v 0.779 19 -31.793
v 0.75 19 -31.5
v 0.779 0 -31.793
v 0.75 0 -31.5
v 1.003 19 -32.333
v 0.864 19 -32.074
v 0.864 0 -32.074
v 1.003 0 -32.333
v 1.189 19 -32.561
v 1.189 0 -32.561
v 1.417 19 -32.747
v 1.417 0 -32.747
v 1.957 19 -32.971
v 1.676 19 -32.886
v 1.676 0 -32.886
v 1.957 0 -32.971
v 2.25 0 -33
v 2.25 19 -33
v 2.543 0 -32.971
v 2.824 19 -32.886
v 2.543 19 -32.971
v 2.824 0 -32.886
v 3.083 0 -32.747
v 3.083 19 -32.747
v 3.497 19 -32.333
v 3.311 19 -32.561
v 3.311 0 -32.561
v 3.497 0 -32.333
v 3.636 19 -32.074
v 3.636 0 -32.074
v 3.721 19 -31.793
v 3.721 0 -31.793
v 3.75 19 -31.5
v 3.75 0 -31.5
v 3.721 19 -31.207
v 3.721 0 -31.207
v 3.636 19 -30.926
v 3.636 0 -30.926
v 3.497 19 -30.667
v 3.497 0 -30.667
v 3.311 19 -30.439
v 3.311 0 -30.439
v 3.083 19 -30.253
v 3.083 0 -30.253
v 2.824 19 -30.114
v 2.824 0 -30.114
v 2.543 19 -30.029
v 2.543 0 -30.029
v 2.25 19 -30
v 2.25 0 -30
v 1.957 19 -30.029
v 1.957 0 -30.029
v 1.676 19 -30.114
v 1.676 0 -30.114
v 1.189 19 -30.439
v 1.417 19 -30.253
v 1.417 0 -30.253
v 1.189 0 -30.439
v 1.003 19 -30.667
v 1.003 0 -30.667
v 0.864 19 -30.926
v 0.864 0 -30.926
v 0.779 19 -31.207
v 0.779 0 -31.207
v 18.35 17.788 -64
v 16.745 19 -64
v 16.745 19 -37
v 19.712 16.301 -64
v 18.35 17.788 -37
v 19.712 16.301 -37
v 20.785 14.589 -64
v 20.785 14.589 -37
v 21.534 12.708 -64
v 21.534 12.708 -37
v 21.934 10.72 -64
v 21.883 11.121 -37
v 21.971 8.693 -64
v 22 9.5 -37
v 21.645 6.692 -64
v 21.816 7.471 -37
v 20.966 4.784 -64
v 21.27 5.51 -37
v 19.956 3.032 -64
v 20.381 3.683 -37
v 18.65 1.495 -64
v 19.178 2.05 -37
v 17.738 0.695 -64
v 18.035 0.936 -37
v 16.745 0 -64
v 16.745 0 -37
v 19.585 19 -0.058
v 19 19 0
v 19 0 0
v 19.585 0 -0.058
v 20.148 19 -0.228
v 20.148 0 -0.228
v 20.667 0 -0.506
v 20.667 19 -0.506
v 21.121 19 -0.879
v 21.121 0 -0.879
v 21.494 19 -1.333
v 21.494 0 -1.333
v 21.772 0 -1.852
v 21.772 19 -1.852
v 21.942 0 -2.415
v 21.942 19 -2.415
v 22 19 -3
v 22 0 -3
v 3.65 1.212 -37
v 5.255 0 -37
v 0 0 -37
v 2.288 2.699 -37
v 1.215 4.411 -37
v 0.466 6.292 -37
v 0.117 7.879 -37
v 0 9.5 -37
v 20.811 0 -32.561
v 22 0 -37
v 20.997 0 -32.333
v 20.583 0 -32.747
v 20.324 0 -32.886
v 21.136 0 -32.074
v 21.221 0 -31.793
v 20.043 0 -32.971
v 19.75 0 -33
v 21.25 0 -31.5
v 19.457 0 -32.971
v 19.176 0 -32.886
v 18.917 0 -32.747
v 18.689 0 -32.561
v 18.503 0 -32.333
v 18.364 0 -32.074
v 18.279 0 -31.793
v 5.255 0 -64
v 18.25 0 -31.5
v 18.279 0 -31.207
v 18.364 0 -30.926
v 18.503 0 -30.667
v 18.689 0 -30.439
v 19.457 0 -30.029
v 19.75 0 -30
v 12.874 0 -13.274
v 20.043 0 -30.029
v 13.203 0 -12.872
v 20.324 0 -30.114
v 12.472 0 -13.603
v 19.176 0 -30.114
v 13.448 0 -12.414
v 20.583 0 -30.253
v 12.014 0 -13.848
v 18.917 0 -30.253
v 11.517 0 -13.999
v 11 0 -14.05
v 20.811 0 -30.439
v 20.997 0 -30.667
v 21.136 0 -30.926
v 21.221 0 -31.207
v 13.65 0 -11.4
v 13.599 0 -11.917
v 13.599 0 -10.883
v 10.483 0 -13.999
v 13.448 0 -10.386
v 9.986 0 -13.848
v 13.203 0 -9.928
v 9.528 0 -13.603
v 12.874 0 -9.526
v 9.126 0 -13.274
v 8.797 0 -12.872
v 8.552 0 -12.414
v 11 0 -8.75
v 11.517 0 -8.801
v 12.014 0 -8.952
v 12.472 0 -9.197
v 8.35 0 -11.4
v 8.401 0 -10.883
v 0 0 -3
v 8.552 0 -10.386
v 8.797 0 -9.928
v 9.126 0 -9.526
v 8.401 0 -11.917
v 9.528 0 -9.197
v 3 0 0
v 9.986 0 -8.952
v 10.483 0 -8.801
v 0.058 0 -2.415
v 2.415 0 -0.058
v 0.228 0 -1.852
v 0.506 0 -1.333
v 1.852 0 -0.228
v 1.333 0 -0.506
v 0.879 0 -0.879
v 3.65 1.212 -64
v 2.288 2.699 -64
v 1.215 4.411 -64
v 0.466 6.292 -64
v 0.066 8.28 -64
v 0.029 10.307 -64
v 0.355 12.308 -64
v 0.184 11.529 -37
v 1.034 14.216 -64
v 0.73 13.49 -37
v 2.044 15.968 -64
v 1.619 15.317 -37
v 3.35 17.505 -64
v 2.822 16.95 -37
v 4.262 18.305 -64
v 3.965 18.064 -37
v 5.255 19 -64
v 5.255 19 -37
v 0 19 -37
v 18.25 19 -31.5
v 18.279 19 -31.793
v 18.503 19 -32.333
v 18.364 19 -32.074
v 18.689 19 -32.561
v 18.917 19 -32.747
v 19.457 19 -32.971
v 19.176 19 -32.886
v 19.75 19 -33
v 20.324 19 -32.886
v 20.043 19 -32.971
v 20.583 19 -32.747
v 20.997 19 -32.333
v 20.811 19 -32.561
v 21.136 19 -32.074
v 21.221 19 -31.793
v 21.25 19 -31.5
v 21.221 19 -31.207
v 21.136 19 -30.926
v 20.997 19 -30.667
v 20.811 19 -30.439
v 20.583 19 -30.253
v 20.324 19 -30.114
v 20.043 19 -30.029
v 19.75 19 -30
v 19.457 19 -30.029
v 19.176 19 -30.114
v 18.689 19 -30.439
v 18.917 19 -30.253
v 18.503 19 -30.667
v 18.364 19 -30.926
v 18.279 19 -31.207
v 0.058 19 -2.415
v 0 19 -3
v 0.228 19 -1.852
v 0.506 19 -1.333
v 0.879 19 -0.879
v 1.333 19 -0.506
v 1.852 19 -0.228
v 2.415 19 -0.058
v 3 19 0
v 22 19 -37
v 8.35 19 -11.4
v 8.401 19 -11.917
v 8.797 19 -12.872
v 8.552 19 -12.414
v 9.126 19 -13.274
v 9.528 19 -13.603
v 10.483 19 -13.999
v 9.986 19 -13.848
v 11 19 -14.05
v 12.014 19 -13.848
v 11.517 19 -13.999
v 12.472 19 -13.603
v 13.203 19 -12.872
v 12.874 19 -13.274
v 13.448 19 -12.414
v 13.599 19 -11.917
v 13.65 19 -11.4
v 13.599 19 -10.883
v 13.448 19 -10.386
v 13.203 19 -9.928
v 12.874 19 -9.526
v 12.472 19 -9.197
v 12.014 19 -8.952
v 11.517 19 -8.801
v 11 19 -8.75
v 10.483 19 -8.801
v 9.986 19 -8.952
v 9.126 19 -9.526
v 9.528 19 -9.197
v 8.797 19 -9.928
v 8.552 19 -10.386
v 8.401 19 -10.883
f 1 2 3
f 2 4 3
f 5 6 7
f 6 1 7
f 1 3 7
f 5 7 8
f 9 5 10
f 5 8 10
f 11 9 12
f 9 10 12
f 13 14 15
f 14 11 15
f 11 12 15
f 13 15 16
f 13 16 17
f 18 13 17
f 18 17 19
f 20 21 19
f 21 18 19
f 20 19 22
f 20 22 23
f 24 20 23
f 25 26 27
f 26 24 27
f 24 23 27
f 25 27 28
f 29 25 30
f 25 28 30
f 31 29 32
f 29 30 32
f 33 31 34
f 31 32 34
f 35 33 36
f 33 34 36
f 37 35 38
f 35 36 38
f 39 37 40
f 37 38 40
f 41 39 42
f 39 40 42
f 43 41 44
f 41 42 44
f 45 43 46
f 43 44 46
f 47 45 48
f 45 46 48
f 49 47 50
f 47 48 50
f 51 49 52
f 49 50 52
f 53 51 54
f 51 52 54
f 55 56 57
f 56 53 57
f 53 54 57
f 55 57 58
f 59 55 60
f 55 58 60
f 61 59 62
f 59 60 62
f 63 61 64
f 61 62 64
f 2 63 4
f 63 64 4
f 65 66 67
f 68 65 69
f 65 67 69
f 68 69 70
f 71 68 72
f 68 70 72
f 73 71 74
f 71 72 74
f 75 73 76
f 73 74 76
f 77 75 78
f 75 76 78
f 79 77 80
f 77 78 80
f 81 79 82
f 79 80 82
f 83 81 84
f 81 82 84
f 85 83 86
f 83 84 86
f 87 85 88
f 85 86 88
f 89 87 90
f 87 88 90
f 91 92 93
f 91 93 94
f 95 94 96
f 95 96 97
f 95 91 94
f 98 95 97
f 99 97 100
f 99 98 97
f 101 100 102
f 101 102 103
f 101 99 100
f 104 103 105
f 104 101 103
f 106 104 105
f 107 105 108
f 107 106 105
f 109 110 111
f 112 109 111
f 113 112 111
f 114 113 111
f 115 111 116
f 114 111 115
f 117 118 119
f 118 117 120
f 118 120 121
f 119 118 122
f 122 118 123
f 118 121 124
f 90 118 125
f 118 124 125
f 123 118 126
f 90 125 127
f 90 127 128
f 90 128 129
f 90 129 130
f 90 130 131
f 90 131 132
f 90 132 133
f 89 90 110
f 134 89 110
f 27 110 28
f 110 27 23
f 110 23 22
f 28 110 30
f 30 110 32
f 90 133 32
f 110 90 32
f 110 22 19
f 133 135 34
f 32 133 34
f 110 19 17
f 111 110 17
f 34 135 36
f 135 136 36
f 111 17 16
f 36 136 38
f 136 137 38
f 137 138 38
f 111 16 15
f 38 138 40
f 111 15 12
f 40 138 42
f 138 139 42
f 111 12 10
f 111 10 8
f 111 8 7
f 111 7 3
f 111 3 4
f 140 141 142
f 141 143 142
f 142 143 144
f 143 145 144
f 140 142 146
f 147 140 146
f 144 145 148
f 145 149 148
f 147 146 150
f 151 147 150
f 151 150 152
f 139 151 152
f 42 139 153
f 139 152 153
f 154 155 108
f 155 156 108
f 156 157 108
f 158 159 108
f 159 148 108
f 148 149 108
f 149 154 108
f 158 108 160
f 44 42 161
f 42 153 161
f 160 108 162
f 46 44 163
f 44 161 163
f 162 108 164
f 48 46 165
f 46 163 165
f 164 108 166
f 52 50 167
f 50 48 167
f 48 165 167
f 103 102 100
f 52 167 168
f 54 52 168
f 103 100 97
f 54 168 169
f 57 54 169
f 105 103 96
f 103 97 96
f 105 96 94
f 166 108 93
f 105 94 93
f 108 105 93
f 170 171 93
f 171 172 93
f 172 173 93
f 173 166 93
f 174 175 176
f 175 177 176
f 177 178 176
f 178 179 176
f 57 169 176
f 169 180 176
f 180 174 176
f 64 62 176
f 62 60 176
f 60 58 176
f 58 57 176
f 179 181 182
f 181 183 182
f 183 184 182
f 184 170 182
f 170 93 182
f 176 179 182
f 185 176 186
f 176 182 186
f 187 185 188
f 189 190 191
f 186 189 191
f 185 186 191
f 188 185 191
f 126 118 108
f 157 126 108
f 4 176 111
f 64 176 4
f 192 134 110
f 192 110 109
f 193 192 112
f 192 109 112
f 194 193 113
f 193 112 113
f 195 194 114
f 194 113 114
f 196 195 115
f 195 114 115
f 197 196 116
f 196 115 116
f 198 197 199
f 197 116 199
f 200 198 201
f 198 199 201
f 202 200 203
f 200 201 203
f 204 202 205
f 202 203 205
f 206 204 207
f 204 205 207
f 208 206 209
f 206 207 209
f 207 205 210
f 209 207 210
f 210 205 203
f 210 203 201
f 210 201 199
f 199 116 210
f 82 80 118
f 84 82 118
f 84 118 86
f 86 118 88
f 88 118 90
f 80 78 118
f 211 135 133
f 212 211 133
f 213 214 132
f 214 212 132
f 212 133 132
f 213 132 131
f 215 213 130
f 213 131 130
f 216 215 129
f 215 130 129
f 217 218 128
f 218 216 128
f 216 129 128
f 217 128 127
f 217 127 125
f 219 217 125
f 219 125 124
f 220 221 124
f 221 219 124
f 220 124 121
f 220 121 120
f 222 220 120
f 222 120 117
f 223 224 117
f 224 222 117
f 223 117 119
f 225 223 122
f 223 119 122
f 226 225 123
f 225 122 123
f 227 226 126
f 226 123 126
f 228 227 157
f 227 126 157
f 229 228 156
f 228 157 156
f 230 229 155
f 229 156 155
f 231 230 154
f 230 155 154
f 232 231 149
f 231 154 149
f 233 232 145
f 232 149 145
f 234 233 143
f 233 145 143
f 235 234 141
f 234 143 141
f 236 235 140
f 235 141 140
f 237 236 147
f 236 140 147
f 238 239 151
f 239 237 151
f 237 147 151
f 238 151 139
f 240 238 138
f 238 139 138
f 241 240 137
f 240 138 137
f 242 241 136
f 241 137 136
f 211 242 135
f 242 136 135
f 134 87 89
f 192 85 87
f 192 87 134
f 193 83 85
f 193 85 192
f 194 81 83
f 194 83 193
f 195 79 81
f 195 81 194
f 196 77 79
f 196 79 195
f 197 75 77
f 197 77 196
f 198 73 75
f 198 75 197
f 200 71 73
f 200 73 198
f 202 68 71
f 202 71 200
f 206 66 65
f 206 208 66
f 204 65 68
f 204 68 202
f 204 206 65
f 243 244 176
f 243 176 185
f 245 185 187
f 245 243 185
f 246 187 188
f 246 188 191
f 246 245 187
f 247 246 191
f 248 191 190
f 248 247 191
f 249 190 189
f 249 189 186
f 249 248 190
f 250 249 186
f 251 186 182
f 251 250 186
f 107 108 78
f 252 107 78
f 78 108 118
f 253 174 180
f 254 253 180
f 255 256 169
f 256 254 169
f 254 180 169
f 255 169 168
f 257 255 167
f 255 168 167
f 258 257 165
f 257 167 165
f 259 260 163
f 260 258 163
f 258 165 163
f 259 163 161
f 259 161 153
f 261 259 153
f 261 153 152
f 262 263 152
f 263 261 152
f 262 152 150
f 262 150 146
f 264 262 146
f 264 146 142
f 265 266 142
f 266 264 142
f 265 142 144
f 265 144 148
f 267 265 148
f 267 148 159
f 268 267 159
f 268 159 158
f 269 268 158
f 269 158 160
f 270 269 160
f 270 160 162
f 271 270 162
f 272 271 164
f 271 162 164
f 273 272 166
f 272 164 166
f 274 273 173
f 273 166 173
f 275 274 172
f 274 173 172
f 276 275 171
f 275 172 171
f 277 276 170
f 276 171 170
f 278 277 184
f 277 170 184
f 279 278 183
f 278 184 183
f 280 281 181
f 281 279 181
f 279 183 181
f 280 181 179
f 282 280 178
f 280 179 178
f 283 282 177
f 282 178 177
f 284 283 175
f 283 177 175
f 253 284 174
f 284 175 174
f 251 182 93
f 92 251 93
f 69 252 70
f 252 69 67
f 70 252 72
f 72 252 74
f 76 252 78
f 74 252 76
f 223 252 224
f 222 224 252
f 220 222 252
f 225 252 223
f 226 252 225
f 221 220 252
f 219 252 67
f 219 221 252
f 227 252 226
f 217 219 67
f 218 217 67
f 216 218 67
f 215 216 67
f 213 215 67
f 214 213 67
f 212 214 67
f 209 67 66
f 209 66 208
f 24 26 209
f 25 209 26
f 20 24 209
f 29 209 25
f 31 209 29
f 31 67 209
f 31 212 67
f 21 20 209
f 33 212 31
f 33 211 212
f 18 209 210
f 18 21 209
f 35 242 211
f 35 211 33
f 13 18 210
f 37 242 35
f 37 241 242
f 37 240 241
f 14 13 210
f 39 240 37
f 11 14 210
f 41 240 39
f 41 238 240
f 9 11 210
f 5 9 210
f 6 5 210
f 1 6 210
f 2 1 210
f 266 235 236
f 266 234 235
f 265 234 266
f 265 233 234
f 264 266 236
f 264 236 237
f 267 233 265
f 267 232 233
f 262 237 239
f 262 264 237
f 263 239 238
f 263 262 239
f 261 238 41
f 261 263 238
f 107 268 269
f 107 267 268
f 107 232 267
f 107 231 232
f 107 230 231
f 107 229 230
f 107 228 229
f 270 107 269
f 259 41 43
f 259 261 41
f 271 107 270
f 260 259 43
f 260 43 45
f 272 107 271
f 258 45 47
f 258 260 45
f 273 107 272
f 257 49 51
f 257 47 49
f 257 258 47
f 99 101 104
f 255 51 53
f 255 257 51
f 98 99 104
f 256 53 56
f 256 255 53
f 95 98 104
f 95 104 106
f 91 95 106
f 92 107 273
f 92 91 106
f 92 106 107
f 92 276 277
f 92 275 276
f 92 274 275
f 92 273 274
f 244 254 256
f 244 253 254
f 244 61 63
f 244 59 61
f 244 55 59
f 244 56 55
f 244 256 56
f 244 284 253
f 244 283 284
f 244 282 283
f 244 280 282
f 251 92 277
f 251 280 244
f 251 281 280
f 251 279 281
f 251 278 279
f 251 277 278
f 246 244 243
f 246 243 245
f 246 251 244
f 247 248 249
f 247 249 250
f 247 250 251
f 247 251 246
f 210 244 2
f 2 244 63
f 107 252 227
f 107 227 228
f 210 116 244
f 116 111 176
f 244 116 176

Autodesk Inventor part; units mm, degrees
ref_plane "YZ Plane" through (0, 0, 0) normal (1, 0, 0) x (0, 1, 0)
ref_plane "XZ Plane" through (0, 0, 0) normal (0, 1, 0) x (-1, 0, 0)
ref_plane "XY Plane" through (0, 0, 0) normal (0, 0, 1) x (1, 0, 0)
sketch "Sketch1" plane through (0, 0, 0) normal (0, 1, 0) x (-1, 0, 0)
  line L0 (0, 0) -> (-22, 0)
  line L1 (-22, 0) -> (-22, -37)
  line L2 (-22, -37) -> (0, -37)
  line L3 (0, -37) -> (0, 0)
  line L4 (-11, -37) -> (-11, 0) construction
  circle A0 centre (-11, -11.4) radius 2.65
  circle A1 centre (-19.75, -31.5) radius 1.5
  circle A2 centre (-2.25, -31.5) radius 1.5
  dimension "gearboxWidth" = 22
  dimension "gearboxLength" = 37
  dimension "shaftDiameter" = 5.3
  dimension "shaftCenterToBottom" = 11.4
  dimension "mountHolesDiameter" = 3
  dimension "mountHolesCenterToCenter" = 17.5
  dimension "mountHolesCenterToEdge" = 5.5
extrude "Extrusion1" add sketch "Sketch1" along normal blind 19
sketch "Sketch2" plane through (22, 0, -37) normal (0, 0, -1) x (-1, 0, 0)
  line L0 (0, 19) -> (22, 19) projected
  line L1 (11, 19) -> (11, 0) construction
  line L2 (0, 0) -> (22, 0) projected
  ellipse E0 centre (11, 9.5) end of major axis (22, 9.5) minor radius 11.1399 (16.7448, 0) -> (16.7448, 19) ccw
  ellipse E1 centre (11, 9.5) end of major axis (22, 9.5) minor radius 11.1399 (5.2552, 19) -> (5.2552, 0) ccw
  line L3 (5.2552, 19) -> (16.7448, 19)
  line L4 (5.2552, 0) -> (16.7448, 0)
extrude "Extrusion2" add sketch "Sketch2" along normal blind 27
fillet "Fillet1" radius 3 2 edges at (0, 9.5, 0) (22, 9.5, 0)
properties part number "Yellow_Motor"
